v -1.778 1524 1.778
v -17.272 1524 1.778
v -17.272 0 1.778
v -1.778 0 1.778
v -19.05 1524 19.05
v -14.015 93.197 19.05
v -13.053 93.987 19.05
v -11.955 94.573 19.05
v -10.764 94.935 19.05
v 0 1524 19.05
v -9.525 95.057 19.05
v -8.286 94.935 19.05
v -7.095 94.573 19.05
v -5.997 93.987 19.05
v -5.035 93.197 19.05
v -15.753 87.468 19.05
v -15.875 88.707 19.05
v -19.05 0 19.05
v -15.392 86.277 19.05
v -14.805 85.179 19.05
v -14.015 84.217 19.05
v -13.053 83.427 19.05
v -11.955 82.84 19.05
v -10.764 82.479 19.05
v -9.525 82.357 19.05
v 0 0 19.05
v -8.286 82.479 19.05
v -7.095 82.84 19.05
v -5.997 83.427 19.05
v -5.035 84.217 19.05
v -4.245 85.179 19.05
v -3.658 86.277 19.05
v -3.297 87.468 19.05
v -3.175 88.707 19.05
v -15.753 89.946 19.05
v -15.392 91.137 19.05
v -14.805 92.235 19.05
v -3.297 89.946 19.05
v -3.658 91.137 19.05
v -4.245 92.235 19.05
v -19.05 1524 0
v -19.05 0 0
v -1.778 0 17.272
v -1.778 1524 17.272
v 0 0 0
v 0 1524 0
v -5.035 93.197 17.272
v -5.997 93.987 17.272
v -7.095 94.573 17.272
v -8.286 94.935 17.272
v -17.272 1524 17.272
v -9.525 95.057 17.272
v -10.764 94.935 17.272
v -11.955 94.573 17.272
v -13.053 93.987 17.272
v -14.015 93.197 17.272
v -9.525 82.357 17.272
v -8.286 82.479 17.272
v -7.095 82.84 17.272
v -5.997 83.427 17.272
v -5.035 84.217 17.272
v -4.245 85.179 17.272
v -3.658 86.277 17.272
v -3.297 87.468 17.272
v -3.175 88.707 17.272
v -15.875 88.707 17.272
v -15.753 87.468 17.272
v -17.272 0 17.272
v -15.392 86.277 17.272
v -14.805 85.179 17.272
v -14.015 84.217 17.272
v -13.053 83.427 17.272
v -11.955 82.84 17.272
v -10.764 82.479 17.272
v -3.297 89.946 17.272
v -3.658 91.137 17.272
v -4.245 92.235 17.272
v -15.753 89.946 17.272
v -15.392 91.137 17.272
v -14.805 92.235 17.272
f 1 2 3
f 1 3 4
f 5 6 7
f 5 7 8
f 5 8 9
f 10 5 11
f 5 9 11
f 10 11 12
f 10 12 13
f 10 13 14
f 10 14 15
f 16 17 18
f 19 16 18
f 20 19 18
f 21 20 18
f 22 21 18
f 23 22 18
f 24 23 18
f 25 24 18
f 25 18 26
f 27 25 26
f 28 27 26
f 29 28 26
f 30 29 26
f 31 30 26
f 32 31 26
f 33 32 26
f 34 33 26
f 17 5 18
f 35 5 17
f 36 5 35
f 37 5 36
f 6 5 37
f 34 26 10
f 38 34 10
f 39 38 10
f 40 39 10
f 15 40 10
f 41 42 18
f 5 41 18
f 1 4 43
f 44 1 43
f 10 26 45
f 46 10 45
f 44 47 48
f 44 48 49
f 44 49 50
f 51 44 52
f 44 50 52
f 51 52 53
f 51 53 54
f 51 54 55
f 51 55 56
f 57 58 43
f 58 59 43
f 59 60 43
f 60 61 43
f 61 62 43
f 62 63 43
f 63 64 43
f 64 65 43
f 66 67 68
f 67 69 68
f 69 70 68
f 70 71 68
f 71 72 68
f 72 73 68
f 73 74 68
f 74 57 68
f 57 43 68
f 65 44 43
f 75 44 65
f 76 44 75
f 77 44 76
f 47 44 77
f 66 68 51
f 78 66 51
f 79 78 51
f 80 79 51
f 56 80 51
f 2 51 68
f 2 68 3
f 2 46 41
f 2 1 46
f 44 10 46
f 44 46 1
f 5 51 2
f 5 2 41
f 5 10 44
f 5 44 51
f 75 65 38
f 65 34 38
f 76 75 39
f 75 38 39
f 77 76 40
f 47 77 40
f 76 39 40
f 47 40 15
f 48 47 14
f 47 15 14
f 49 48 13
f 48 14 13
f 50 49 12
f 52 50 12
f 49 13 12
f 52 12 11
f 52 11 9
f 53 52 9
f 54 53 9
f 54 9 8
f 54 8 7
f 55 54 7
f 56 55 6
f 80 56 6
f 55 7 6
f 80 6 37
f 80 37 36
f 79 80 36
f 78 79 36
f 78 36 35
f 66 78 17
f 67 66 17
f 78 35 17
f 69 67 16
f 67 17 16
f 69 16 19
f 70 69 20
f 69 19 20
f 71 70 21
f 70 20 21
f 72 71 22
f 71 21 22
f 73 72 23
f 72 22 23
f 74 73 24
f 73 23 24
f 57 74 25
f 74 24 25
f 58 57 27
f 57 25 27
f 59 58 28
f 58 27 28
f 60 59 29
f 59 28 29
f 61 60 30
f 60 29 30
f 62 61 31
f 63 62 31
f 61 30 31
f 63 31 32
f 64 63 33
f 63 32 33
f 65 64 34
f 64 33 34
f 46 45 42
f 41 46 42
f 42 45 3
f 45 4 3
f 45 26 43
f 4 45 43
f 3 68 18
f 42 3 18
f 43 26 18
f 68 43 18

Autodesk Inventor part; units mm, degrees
ref_plane "YZ Plane" through (0, 0, 0) normal (1, 0, 0) x (0, 1, 0)
ref_plane "XZ Plane" through (0, 0, 0) normal (0, 1, 0) x (-1, 0, 0)
ref_plane "XY Plane" through (0, 0, 0) normal (0, 0, 1) x (1, 0, 0)
sketch "Sketch1" plane through (0, 0, 0) normal (0, 1, 0) x (-1, 0, 0)
  line L0 (0, 0) -> (19.05, 0)
  line L1 (19.05, 0) -> (19.05, 19.05)
  line L2 (19.05, 19.05) -> (0, 19.05)
  line L3 (0, 19.05) -> (0, 0)
  line L4 (1.778, 17.272) -> (17.272, 17.272)
  line L5 (17.272, 17.272) -> (17.272, 1.778)
  line L6 (17.272, 1.778) -> (1.778, 1.778)
  line L7 (1.778, 1.778) -> (1.778, 17.272)
  dimension "MastWidth" = 19.05
  dimension "d1" = 19.05
  dimension "d2" = 1.778
  dimension "d3" = 1.778
  dimension "d4" = 1.778
  dimension "d5" = 1.778
extrude "Extrusion1" add sketch "Sketch1" along normal blind 1524
sketch "Sketch2" plane through (0, 0, 0) normal (0, -1, 0) x (1, 0, 0)
  line L0 (-17.272, 1.778) -> (-17.272, 17.272) projected
  line L1 (-17.272, 17.272) -> (-1.778, 17.272) projected
  line L2 (-1.778, 17.272) -> (-1.778, 1.778) projected
  line L3 (-1.778, 1.778) -> (-17.272, 1.778) projected
  line L4 (0, 0) -> (-19.05, 0) projected
  line L5 (0, 19.05) -> (0, 0) projected
  line L6 (-19.05, 19.05) -> (0, 19.05) projected
  line L7 (-19.05, 0) -> (-19.05, 19.05) projected
  line L8 (-19.05, 9.525) -> (0, 9.525)
  line L9 (-9.525, 19.05) -> (-9.525, 0)
sketch "Sketch3" plane through (-19.05, 0, 19.05) normal (0, 0, 1) x (1, 0, 0)
  line L0 (19.05, 1524) -> (0, 1524) projected
  line L1 (0, 0) -> (0, 1524) projected
  line L2 (0, 0) -> (19.05, 0) projected
  line L3 (19.05, 0) -> (19.05, 1524) projected
  line L4 (7.0234, 1484.4913) -> (20.0256, 1484.4913) construction
  line L5 (20.0256, 1484.4913) -> (20.0256, 1481.3149) construction
  line L6 (20.0256, 1481.3149) -> (7.0234, 1481.3149) construction
  line L7 (7.0234, 1481.3149) -> (7.0234, 1484.4913) construction
sketch "Sketch4" plane through (-19.05, 0, 19.05) normal (0, 0, 1) x (1, 0, 0)
  circle A0 centre (9.525, 88.7067) radius 6.35
  dimension "d8" = 12.7
extrude "Extrusion2" cut sketch "Sketch4" against normal blind 6.35
equation "\"d1\" = MastWidth"
equation "\"d3\" = d2"
equation "\"d4\" = d2"
equation "\"d5\" = d2"
properties part number "Robot-Mast" material "Aluminum-6061"
